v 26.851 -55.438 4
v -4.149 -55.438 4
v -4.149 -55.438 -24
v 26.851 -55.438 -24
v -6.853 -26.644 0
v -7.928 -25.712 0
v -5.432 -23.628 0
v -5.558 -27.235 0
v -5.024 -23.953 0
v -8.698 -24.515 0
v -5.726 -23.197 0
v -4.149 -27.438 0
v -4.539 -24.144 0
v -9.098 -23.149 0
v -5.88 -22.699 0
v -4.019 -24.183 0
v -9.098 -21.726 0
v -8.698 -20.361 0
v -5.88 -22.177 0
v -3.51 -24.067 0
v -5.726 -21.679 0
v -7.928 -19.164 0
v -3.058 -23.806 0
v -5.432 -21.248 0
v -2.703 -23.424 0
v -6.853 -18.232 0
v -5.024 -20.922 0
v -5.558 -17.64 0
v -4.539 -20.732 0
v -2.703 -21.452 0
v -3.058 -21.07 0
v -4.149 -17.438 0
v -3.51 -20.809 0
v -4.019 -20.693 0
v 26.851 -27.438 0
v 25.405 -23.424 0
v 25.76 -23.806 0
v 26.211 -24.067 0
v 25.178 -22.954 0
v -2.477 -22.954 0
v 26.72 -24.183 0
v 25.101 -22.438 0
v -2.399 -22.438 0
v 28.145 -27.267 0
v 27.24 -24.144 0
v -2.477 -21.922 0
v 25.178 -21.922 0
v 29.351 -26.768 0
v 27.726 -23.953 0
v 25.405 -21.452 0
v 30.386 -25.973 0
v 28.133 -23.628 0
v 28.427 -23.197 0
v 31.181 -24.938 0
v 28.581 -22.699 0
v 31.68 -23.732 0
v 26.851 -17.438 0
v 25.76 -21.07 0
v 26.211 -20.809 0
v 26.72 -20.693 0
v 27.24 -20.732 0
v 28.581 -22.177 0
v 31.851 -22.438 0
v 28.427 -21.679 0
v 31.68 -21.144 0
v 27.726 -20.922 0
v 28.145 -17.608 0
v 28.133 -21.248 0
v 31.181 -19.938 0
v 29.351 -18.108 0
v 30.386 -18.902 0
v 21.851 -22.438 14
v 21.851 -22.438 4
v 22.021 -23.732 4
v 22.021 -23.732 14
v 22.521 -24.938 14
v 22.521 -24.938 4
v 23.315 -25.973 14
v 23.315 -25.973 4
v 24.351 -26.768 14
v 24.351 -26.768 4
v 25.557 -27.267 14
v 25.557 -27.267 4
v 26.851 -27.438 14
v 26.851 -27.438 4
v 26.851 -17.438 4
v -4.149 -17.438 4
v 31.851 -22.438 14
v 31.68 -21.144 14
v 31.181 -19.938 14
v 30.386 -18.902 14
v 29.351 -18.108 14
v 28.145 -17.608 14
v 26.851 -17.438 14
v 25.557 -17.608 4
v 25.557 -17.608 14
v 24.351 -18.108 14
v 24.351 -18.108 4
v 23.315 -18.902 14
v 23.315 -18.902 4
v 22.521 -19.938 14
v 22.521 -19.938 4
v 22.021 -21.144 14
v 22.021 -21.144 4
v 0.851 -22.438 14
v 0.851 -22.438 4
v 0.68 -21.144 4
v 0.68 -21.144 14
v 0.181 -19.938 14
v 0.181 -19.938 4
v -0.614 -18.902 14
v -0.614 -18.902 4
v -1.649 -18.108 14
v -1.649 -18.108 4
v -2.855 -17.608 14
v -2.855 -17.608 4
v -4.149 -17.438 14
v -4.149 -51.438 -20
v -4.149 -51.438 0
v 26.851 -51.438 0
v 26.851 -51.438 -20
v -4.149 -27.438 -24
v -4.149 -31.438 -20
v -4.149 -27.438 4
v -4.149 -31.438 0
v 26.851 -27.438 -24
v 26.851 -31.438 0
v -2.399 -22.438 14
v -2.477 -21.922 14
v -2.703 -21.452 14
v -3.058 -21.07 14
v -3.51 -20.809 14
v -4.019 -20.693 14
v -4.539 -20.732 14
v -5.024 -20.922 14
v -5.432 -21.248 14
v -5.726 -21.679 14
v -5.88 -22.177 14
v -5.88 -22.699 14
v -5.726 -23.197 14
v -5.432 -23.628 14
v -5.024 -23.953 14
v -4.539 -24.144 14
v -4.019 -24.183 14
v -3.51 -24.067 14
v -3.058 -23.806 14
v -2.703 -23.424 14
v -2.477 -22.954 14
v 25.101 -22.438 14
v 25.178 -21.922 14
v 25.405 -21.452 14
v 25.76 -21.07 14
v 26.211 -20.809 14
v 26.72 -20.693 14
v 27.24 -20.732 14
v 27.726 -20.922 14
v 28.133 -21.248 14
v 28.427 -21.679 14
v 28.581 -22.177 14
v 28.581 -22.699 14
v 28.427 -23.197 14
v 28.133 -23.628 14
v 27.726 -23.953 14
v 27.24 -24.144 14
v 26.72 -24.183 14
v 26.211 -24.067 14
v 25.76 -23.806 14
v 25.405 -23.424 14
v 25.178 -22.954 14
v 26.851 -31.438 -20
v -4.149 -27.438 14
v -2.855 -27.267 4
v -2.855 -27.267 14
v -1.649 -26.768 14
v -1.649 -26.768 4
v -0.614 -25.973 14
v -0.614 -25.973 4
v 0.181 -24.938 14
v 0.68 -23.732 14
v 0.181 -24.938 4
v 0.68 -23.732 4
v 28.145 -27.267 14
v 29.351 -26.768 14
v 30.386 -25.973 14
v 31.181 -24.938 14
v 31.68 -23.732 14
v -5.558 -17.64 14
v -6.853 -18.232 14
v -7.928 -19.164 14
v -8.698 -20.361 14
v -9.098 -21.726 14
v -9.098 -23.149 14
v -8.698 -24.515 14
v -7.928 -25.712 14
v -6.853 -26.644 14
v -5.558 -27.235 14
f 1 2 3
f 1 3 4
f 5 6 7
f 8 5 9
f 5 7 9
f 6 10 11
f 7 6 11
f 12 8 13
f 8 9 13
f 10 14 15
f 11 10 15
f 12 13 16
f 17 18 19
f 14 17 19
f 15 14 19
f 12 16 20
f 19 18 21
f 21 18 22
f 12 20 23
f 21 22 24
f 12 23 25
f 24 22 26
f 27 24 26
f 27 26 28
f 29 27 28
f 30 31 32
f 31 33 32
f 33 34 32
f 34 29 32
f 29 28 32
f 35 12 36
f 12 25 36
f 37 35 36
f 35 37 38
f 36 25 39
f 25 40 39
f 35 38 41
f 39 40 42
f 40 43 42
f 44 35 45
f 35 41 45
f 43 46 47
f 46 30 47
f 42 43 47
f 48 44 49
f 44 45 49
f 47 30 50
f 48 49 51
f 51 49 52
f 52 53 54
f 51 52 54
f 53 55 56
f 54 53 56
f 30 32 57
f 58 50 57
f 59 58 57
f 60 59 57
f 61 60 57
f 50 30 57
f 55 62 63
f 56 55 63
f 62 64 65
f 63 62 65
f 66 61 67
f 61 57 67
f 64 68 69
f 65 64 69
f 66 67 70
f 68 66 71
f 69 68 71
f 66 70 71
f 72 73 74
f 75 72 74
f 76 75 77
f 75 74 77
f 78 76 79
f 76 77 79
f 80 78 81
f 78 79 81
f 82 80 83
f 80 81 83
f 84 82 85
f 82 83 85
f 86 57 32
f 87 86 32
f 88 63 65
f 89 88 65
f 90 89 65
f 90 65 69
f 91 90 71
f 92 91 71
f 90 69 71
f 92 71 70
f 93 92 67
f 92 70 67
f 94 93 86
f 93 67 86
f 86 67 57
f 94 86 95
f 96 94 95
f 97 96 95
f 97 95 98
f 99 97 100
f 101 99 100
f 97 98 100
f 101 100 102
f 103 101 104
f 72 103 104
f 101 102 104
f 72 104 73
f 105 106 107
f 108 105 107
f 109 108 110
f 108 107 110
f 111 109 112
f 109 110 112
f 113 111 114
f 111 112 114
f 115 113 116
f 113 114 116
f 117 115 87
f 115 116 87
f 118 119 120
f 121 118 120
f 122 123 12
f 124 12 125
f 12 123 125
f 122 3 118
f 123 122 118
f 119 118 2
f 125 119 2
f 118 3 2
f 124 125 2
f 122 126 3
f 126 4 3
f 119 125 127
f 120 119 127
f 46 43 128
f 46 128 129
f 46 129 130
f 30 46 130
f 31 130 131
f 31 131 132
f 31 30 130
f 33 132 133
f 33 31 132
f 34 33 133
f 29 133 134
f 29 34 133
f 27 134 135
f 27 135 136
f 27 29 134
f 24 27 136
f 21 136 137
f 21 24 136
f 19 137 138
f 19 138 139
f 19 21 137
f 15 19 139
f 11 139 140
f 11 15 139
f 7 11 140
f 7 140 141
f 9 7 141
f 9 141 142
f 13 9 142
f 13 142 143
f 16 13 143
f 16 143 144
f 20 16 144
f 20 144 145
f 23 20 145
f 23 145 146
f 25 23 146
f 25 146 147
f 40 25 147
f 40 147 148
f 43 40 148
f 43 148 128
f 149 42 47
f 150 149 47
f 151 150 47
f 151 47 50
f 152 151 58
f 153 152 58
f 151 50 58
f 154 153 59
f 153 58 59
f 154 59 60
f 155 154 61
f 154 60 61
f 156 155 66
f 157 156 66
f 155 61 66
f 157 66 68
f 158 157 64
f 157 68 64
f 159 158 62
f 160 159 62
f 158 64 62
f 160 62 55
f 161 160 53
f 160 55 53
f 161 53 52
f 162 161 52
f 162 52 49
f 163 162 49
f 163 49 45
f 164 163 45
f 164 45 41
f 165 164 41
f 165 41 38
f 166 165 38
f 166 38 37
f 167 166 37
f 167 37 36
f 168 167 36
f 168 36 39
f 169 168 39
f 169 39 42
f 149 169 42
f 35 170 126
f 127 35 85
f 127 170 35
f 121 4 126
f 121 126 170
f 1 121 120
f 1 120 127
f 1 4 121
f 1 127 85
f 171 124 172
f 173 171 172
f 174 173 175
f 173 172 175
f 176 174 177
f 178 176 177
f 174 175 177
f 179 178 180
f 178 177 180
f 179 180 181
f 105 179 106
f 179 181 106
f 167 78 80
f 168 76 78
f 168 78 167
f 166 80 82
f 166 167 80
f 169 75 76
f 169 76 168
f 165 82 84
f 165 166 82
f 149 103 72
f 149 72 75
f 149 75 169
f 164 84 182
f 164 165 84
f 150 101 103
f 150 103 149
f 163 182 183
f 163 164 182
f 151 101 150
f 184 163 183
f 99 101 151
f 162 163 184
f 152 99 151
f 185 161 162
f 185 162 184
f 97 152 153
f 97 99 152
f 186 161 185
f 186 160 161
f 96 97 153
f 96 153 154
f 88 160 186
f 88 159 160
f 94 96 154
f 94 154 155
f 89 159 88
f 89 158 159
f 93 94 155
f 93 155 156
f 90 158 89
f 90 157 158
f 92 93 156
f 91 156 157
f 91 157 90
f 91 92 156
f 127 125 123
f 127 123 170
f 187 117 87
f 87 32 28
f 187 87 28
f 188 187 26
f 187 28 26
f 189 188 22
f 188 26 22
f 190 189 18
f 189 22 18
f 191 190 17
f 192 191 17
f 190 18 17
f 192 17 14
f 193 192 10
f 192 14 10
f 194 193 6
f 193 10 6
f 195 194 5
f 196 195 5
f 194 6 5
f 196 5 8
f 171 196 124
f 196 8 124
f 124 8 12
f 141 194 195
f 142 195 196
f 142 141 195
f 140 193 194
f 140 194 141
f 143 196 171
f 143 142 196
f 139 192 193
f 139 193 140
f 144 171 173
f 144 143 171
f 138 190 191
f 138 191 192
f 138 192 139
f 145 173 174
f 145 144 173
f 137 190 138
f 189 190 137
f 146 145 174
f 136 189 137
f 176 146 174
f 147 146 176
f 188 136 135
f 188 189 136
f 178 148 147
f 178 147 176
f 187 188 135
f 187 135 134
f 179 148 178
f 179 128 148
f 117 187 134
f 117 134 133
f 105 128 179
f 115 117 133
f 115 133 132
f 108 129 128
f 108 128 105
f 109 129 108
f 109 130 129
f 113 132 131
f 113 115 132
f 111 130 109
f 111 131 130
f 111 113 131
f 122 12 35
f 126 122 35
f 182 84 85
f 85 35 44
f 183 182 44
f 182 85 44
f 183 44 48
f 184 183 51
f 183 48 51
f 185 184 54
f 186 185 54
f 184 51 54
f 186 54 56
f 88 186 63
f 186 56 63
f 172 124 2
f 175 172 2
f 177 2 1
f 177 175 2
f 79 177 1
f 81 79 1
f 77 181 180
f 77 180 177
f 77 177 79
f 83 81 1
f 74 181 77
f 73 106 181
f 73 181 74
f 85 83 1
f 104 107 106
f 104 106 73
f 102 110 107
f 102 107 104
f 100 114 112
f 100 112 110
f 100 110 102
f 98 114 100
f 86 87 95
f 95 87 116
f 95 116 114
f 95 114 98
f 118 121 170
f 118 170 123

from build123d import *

# Parameters (mm, degrees)
F0_R      = 1.75
F1_DEPTH  = 4
F2_DEPTH  = 14
F1_FACE_W = 31
F1_FACE_H = 4
F3_DEPTH  = 28
F4_W      = 31
F4_H      = 4
F5_DEPTH  = 24
F7_W      = 31
F7_H      = 4
F8_DEPTH  = 24
F6_W      = 31
F6_H      = 4
F9_DEPTH  = 20


with BuildPart() as f1:
    # F0 (on Top) → F1 (new body)
    with BuildSketch(Plane.XY):
        with BuildLine():
            ThreePointArc((-4.149364, -27.437859), (-0.61383, -25.973393), (0.850636, -22.437859))
            ThreePointArc((0.850636, -22.437859), (-0.61383, -18.902325), (-4.149364, -17.437859))
            ThreePointArc((-4.149364, -17.437859), (-9.149364, -22.437859), (-4.149364, -27.437859))
        make_face()
        with Locations((-4.149364, -22.437859)):
            Circle(F0_R, mode=Mode.SUBTRACT)
        with BuildLine():
            ThreePointArc((-4.149364, -17.437859), (-0.61383, -18.902325), (0.850636, -22.437859))
            Line((0.850636, -22.437859), (21.850636, -22.437859))
            ThreePointArc((21.850636, -22.437859), (23.315102, -18.902325), (26.850636, -17.437859))
            Line((26.850636, -17.437859), (-4.149364, -17.437859))
        make_face()
        with BuildLine():
            ThreePointArc((26.850636, -17.437859), (23.315102, -18.902325), (21.850636, -22.437859))
            ThreePointArc((21.850636, -22.437859), (23.315102, -25.973393), (26.850636, -27.437859))
            ThreePointArc((26.850636, -27.437859), (30.38617, -25.973393), (31.850636, -22.437859))
            ThreePointArc((31.850636, -22.437859), (30.38617, -18.902325), (26.850636, -17.437859))
        make_face()
        with BuildLine():
            ThreePointArc((28.600636, -22.437859), (26.850636, -24.187859), (25.100636, -22.437859))
            ThreePointArc((25.100636, -22.437859), (26.850636, -20.687859), (28.600636, -22.437859))
        make_face(mode=Mode.SUBTRACT)
        with BuildLine():
            Line((21.850636, -22.437859), (0.850636, -22.437859))
            ThreePointArc((0.850636, -22.437859), (-0.61383, -25.973393), (-4.149364, -27.437859))
            Line((-4.149364, -27.437859), (26.850636, -27.437859))
            ThreePointArc((26.850636, -27.437859), (23.315102, -25.973393), (21.850636, -22.437859))
        make_face()
    extrude(amount=F1_DEPTH)

    # F0 (on Top) → F2 (join)
    with BuildSketch(Plane.XY):
        with BuildLine():
            ThreePointArc((-4.149364, -27.437859), (-0.61383, -25.973393), (0.850636, -22.437859))
            ThreePointArc((0.850636, -22.437859), (-0.61383, -18.902325), (-4.149364, -17.437859))
            ThreePointArc((-4.149364, -17.437859), (-9.149364, -22.437859), (-4.149364, -27.437859))
        make_face()
        with Locations((-4.149364, -22.437859)):
            Circle(F0_R, mode=Mode.SUBTRACT)
        with BuildLine():
            ThreePointArc((26.850636, -17.437859), (23.315102, -18.902325), (21.850636, -22.437859))
            ThreePointArc((21.850636, -22.437859), (23.315102, -25.973393), (26.850636, -27.437859))
            ThreePointArc((26.850636, -27.437859), (30.38617, -25.973393), (31.850636, -22.437859))
            ThreePointArc((31.850636, -22.437859), (30.38617, -18.902325), (26.850636, -17.437859))
        make_face()
        with BuildLine():
            ThreePointArc((28.600636, -22.437859), (26.850636, -24.187859), (25.100636, -22.437859))
            ThreePointArc((25.100636, -22.437859), (26.850636, -20.687859), (28.600636, -22.437859))
        make_face(mode=Mode.SUBTRACT)
    extrude(amount=F2_DEPTH)

    # F1_face (on face) → F3 (join)
    with BuildSketch(Plane(origin=(11.350636, -27.437859, 2), x_dir=(1, 0, 0), z_dir=(0, -1, 0))):
        Rectangle(F1_FACE_W, F1_FACE_H)
    extrude(amount=F3_DEPTH)

    # F4 (on face) → F5 (join)
    with BuildSketch(Plane(origin=(0, 0, 0), x_dir=(1, 0, 0), z_dir=(0, 0, -1))):
        with Locations((11.350636, 53.437859)):
            Rectangle(F4_W, F4_H)
    extrude(amount=F5_DEPTH)

    # F7 (on face) → F8 (join)
    with BuildSketch(Plane(origin=(0, 0, 0), x_dir=(1, 0, 0), z_dir=(0, 0, -1))):
        with Locations((11.350636, 29.437859)):
            Rectangle(F7_W, F7_H)
    extrude(amount=F8_DEPTH)

    # F6 (on face) → F9 (join, through all)
    with BuildSketch(Plane(origin=(0, -51.437859, 0), x_dir=(-1, 0, 0), z_dir=(0, 1, 0))):
        with Locations((-11.350636, -22)):
            Rectangle(F6_W, F6_H)
    extrude(amount=F9_DEPTH)


solid = f1.part
